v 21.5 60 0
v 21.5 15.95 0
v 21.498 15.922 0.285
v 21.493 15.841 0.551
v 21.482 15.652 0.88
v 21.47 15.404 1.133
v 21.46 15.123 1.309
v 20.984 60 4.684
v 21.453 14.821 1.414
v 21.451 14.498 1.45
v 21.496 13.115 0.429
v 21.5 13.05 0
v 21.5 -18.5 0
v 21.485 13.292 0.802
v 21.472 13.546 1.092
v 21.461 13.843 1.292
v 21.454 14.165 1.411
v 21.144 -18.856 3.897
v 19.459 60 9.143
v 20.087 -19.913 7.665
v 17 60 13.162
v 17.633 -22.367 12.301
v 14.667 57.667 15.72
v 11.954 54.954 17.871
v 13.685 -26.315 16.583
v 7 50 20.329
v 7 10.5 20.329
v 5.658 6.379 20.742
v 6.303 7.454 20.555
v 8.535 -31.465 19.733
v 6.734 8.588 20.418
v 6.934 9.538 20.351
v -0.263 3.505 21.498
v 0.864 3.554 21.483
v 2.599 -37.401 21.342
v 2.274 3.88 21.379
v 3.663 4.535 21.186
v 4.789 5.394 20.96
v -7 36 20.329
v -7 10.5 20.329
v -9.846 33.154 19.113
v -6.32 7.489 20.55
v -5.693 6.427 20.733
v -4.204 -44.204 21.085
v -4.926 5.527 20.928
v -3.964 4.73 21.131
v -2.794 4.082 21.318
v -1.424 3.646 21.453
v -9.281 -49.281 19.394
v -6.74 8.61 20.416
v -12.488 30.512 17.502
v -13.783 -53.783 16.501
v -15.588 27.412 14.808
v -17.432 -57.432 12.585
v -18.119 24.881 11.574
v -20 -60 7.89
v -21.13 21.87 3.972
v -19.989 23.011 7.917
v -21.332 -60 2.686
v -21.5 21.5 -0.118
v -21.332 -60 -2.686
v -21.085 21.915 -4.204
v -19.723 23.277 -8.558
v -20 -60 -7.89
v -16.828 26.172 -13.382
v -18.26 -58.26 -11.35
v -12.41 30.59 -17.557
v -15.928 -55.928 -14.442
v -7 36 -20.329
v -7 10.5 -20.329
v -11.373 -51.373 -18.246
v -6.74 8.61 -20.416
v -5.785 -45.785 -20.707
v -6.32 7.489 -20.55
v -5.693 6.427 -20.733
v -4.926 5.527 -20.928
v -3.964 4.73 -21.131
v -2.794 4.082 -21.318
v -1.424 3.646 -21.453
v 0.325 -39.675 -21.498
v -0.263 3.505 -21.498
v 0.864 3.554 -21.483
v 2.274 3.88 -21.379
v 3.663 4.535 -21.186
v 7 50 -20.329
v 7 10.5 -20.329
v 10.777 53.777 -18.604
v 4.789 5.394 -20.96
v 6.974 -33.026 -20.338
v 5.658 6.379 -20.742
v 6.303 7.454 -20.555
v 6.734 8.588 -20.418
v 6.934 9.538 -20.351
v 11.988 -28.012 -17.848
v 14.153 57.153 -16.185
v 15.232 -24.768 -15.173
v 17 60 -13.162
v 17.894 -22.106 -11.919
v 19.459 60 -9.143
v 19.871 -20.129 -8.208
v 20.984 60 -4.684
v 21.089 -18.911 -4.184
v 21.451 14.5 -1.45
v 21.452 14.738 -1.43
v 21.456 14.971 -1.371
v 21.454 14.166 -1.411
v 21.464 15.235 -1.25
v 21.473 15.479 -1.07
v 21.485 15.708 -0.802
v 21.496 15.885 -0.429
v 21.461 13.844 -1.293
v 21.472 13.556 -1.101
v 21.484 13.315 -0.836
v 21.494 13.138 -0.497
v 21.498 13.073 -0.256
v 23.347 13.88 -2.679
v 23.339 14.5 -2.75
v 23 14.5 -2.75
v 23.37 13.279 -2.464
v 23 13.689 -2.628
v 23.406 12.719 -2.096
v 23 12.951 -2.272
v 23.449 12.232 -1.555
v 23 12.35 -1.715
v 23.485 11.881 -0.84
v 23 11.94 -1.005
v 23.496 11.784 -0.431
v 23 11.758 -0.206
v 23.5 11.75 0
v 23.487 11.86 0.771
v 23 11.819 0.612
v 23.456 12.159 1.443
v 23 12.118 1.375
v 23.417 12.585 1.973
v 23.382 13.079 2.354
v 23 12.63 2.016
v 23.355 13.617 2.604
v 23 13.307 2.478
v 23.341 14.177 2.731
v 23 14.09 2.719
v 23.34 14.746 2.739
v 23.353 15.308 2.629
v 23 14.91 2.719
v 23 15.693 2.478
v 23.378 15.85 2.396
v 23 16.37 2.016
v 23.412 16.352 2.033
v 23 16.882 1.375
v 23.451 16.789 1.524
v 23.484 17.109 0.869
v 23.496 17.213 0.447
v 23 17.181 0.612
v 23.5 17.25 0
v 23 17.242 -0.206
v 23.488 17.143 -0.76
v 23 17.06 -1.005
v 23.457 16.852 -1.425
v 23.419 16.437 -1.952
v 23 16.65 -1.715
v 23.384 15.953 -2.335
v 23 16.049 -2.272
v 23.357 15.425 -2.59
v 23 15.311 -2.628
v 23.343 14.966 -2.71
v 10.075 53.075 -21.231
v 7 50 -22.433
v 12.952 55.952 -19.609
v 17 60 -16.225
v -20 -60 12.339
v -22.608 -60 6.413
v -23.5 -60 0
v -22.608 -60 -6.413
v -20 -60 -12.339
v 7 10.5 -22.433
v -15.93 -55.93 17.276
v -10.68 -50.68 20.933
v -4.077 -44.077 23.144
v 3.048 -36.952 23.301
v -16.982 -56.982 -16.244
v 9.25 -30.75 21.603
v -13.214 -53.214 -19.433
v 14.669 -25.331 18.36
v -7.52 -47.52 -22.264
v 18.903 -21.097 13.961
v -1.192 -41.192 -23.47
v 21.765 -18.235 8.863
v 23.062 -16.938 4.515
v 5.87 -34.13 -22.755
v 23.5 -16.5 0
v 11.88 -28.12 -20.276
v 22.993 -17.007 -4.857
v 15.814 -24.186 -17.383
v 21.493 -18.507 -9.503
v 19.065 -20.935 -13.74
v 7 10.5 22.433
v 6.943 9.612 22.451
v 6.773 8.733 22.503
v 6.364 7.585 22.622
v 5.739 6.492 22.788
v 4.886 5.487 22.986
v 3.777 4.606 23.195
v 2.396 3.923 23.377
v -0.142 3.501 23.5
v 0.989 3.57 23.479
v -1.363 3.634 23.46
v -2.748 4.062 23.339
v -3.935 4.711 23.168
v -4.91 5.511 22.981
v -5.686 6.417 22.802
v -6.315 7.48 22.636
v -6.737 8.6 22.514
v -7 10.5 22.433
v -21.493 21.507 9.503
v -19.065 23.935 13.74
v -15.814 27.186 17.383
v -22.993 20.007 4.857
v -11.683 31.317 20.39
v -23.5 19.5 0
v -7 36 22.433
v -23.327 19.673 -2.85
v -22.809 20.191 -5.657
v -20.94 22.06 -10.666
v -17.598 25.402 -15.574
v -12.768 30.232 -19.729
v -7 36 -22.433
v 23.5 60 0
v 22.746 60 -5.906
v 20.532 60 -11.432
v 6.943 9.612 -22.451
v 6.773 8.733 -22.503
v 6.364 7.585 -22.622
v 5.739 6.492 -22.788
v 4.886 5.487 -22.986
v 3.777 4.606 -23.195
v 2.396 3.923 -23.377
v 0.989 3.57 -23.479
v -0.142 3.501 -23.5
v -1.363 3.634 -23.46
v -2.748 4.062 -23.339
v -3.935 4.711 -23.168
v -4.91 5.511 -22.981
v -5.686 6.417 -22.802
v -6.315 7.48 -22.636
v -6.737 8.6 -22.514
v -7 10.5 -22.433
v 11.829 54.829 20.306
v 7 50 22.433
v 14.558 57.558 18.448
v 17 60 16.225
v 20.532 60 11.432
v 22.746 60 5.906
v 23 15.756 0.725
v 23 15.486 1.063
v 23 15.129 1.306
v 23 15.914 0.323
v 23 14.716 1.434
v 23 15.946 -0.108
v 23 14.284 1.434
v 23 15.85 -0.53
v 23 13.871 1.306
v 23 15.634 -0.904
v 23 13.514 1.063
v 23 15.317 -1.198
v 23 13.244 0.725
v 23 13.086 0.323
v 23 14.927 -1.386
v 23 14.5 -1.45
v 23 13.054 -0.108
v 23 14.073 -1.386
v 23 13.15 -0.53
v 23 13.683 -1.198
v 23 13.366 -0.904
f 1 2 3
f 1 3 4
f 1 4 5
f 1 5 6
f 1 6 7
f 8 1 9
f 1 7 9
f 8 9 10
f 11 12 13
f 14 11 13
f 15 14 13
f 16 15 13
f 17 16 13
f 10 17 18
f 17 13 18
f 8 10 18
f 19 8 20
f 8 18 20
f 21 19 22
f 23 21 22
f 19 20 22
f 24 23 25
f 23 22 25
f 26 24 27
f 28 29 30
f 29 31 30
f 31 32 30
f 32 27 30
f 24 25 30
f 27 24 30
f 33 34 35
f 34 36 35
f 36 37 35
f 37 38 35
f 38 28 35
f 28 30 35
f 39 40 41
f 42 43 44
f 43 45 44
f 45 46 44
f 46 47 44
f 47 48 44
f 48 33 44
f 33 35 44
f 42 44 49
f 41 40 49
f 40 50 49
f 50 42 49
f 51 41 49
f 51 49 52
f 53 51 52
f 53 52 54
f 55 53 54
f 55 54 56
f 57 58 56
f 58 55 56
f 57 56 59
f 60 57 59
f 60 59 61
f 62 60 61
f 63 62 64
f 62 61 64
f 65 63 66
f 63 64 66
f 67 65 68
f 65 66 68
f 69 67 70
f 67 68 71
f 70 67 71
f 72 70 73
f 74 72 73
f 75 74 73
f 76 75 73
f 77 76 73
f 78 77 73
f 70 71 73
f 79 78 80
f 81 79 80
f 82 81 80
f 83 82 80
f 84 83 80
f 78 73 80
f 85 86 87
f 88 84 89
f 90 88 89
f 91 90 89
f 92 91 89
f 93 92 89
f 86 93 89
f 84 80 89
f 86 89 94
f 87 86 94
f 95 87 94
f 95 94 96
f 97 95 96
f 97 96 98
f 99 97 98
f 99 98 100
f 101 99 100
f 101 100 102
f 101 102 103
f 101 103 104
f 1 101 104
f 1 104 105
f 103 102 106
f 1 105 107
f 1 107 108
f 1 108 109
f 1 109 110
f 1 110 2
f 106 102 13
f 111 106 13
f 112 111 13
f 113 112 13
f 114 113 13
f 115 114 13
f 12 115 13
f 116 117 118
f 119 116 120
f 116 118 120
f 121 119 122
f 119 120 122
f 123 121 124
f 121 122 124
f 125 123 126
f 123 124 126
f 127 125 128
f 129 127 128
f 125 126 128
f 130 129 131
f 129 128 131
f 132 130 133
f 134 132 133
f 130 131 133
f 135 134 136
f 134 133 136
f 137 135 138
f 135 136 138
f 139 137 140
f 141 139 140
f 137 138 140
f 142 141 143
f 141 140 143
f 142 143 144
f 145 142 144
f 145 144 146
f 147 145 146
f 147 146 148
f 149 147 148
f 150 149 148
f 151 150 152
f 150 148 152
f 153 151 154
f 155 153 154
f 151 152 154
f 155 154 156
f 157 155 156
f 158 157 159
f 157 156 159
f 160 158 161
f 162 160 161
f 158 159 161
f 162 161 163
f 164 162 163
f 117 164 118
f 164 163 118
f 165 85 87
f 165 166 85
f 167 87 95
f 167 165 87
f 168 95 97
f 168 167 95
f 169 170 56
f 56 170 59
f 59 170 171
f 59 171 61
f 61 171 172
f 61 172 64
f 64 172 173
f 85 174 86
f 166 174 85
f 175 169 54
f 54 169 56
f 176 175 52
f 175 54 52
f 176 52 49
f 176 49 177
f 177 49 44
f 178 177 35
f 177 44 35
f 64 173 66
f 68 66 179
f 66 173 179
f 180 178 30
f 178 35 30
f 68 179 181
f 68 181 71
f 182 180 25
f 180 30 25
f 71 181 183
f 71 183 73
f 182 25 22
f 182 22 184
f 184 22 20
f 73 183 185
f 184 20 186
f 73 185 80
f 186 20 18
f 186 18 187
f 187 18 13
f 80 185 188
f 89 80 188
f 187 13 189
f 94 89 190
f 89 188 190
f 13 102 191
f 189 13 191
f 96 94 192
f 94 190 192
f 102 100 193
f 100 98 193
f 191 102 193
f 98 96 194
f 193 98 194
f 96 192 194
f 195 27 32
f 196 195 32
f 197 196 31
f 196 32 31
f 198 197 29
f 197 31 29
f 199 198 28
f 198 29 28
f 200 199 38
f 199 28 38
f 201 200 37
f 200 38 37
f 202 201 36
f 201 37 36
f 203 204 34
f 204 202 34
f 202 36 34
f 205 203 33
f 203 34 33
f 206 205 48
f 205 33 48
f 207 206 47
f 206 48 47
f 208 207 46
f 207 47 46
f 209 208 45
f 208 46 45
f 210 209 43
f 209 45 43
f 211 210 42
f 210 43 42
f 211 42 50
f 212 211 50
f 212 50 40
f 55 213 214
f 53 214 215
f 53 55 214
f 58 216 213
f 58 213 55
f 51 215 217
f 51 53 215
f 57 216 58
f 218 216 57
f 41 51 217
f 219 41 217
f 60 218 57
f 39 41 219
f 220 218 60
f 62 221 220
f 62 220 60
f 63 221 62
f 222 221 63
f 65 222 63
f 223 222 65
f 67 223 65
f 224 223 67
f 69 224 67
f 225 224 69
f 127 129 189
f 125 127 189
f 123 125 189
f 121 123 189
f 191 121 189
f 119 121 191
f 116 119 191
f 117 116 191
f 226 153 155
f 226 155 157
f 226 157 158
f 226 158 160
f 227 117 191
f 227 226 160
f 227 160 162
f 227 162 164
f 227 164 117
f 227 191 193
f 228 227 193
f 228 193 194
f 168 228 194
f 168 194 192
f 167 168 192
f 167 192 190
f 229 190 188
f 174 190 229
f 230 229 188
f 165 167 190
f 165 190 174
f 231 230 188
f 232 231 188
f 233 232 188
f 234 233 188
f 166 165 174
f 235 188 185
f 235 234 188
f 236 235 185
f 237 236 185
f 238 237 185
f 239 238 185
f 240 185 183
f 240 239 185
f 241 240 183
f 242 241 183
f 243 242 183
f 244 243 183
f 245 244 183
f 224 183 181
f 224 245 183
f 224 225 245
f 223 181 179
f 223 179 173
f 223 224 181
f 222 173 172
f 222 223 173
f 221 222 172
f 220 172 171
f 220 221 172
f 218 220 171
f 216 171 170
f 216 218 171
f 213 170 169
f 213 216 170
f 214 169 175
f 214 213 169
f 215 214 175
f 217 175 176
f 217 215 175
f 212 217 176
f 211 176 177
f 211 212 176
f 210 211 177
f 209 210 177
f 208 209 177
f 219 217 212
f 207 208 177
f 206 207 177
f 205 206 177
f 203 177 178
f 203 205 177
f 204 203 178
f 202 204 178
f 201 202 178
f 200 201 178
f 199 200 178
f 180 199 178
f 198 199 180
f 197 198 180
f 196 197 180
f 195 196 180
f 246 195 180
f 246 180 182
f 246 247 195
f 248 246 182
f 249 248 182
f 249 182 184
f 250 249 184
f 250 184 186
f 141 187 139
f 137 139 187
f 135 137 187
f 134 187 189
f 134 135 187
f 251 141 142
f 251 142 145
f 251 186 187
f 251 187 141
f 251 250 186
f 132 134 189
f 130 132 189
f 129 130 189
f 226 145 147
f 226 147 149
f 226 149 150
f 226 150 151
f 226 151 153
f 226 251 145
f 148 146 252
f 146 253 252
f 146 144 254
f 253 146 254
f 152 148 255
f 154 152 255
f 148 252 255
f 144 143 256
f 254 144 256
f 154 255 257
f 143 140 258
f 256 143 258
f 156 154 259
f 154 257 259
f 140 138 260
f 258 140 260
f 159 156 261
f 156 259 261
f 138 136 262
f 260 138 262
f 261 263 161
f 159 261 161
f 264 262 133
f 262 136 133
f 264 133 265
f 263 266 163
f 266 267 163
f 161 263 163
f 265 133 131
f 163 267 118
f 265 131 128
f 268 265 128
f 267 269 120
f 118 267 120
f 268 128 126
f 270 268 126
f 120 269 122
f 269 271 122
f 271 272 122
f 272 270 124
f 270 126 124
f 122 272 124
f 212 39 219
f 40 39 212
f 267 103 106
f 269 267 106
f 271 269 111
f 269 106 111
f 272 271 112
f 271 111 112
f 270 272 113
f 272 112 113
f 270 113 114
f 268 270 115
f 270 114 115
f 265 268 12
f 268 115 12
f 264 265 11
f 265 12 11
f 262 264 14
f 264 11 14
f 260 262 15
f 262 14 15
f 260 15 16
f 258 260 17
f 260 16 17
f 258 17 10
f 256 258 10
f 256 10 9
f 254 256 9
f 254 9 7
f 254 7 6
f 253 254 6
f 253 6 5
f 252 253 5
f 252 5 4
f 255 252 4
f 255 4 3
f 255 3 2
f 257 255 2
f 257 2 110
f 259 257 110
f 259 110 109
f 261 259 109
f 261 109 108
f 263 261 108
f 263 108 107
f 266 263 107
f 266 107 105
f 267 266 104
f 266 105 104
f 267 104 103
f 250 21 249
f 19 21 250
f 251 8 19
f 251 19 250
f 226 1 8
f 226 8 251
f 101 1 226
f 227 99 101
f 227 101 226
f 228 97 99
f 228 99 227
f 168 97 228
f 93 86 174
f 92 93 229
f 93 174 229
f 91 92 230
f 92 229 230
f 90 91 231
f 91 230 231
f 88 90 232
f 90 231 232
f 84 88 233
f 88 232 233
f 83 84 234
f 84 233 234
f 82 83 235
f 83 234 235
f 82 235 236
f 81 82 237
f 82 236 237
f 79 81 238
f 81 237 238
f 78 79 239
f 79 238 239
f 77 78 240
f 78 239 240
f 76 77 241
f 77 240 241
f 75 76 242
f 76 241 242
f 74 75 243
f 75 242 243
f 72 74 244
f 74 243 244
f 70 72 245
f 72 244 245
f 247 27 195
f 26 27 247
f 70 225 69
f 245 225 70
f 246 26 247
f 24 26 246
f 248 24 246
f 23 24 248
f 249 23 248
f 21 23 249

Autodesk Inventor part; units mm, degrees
ref_plane "XZ Plane" through (0, 0, 0) normal (0, 1, 0) x (-1, 0, 0)
ref_plane "XY Plane" through (0, 0, 0) normal (0, 0, 1) x (1, 0, 0)
sketch "Sketch1" plane through (0, 0, 0) normal (0, 0, 1) x (1, 0, 0)
  line L0 (-23.5, -60) -> (23.5, -60)
  line L1 (23.5, -60) -> (23.5, 60)
  line L2 (23.5, 60) -> (-23.5, 60)
  line L3 (-23.5, 60) -> (-23.5, -60)
  line L4 (-23.5, -60) -> (23.5, 60) construction
  line L5 (23.5, -60) -> (-23.5, 60) construction
  line L6 (-23.5, 19.5) -> (17, 60)
  line L7 (-20, -60) -> (23.5, -16.5)
  line L8 (21.5, 60) -> (21.5, -60)
  line L9 (-21.5, 60) -> (-21.5, -60)
  line L10 (0, 60) -> (0, 10.5) construction
  line L11 (-7, 60) -> (-7, 10.5)
  line L12 (7, 10.5) -> (7, 60)
  arc A0 (7, 60) -> (-7, 60) centre (0, 60) ccw
  arc A1 (-7, 10.5) -> (7, 10.5) centre (0, 10.5) ccw
  line L13 (0, 60) -> (0, -60)
  line L14 (0, -85.4) -> (0, 92.4) projected
  point P0 (0, 0)
  point P1 (0, 35.25)
  point P2 (-7, 36)
  point P3 (7, 50)
  dimension "d0" = 2
  dimension "d1" = 2
  dimension "d2" = 47
  dimension "d3" = 14
  dimension "d4" = 120
  dimension "d5" = 56.5
  dimension "d6" = 20
  dimension "d7" = 45
  dimension "d9" = 17
revolve "Revolution1" add sketch "Sketch1" angle 360 about axis through (0, -10, 0) along (0, 1, 0) contours L8 L7 L1 L0 | L8 L2 L1 L7
extrude "Extrusion1" cut sketch "Sketch1" along normal through all both and the other way through all contours L3 L2 L9 L6 | L7 L13 L0 | L9 L2 L11 L6 | L13 L7 L8 L0 | L11 L2 L13 L6 | L6 L13 A1 L11 | L8 L7 L1 L0 | L13 L6 L12 A1 | L13 L2 L12 L6 | A0 L14 L2 | L12 L2 L6 | L14 A0 L2
ref_plane "Work Plane1" through (23.5, 0, 0) normal (1, 0, 0) x (0, 1, 0)
sketch "Sketch2" plane through (23.5, 0, 0) normal (1, 0, 0) x (0, 1, 0)
  arc A0 (60, -16.225) -> (50, 22.4332) centre (43, 0) ccw projected
  line L0 (50, 22.4332) -> (10.5, 22.4332) projected
  line L1 (10.5, 22.4332) -> (36, 22.4332) projected
  arc A1 (36, 22.4332) -> (36, -22.4332) centre (43, 0) ccw projected
  line L2 (36, -22.4332) -> (10.5, -22.4332) projected
  line L3 (10.5, -22.4332) -> (50, -22.4332) projected
  arc A2 (50, -22.4332) -> (60, 16.225) centre (43, 0) ccw projected
  line L4 (60, 16.225) -> (60, -16.225) projected
  arc A3 (-60, -12.339) -> (-60, 12.339) centre (-40, 0) ccw projected
  line L5 (-60, 12.339) -> (-60, -12.339) projected
  line L6 (60, -16.225) -> (60, 16.225) projected
  line L7 (60, 0) -> (-16.5, 0)
  arc A4 (-60, -12.339) -> (-60, 12.339) centre (-40, 0) ccw projected
  point P0 (0, 0)
  point P1 (19.5, 0)
  point P2 (14.5, 0)
  dimension "d20" = 5
hole "Hole1" at (23.5, 14.5, 0) direction (-1, 0, 0) diameter 2.9 depth 5 counterbore diameter 5.5 counterbore depth 0.5 clearance for "Socket Head Cap Screw DIN EN ISO 4762" size "M2.5" standard "DIN"
equation "\"d1\" = d0"
properties part number "Test_Blade_Guard"
